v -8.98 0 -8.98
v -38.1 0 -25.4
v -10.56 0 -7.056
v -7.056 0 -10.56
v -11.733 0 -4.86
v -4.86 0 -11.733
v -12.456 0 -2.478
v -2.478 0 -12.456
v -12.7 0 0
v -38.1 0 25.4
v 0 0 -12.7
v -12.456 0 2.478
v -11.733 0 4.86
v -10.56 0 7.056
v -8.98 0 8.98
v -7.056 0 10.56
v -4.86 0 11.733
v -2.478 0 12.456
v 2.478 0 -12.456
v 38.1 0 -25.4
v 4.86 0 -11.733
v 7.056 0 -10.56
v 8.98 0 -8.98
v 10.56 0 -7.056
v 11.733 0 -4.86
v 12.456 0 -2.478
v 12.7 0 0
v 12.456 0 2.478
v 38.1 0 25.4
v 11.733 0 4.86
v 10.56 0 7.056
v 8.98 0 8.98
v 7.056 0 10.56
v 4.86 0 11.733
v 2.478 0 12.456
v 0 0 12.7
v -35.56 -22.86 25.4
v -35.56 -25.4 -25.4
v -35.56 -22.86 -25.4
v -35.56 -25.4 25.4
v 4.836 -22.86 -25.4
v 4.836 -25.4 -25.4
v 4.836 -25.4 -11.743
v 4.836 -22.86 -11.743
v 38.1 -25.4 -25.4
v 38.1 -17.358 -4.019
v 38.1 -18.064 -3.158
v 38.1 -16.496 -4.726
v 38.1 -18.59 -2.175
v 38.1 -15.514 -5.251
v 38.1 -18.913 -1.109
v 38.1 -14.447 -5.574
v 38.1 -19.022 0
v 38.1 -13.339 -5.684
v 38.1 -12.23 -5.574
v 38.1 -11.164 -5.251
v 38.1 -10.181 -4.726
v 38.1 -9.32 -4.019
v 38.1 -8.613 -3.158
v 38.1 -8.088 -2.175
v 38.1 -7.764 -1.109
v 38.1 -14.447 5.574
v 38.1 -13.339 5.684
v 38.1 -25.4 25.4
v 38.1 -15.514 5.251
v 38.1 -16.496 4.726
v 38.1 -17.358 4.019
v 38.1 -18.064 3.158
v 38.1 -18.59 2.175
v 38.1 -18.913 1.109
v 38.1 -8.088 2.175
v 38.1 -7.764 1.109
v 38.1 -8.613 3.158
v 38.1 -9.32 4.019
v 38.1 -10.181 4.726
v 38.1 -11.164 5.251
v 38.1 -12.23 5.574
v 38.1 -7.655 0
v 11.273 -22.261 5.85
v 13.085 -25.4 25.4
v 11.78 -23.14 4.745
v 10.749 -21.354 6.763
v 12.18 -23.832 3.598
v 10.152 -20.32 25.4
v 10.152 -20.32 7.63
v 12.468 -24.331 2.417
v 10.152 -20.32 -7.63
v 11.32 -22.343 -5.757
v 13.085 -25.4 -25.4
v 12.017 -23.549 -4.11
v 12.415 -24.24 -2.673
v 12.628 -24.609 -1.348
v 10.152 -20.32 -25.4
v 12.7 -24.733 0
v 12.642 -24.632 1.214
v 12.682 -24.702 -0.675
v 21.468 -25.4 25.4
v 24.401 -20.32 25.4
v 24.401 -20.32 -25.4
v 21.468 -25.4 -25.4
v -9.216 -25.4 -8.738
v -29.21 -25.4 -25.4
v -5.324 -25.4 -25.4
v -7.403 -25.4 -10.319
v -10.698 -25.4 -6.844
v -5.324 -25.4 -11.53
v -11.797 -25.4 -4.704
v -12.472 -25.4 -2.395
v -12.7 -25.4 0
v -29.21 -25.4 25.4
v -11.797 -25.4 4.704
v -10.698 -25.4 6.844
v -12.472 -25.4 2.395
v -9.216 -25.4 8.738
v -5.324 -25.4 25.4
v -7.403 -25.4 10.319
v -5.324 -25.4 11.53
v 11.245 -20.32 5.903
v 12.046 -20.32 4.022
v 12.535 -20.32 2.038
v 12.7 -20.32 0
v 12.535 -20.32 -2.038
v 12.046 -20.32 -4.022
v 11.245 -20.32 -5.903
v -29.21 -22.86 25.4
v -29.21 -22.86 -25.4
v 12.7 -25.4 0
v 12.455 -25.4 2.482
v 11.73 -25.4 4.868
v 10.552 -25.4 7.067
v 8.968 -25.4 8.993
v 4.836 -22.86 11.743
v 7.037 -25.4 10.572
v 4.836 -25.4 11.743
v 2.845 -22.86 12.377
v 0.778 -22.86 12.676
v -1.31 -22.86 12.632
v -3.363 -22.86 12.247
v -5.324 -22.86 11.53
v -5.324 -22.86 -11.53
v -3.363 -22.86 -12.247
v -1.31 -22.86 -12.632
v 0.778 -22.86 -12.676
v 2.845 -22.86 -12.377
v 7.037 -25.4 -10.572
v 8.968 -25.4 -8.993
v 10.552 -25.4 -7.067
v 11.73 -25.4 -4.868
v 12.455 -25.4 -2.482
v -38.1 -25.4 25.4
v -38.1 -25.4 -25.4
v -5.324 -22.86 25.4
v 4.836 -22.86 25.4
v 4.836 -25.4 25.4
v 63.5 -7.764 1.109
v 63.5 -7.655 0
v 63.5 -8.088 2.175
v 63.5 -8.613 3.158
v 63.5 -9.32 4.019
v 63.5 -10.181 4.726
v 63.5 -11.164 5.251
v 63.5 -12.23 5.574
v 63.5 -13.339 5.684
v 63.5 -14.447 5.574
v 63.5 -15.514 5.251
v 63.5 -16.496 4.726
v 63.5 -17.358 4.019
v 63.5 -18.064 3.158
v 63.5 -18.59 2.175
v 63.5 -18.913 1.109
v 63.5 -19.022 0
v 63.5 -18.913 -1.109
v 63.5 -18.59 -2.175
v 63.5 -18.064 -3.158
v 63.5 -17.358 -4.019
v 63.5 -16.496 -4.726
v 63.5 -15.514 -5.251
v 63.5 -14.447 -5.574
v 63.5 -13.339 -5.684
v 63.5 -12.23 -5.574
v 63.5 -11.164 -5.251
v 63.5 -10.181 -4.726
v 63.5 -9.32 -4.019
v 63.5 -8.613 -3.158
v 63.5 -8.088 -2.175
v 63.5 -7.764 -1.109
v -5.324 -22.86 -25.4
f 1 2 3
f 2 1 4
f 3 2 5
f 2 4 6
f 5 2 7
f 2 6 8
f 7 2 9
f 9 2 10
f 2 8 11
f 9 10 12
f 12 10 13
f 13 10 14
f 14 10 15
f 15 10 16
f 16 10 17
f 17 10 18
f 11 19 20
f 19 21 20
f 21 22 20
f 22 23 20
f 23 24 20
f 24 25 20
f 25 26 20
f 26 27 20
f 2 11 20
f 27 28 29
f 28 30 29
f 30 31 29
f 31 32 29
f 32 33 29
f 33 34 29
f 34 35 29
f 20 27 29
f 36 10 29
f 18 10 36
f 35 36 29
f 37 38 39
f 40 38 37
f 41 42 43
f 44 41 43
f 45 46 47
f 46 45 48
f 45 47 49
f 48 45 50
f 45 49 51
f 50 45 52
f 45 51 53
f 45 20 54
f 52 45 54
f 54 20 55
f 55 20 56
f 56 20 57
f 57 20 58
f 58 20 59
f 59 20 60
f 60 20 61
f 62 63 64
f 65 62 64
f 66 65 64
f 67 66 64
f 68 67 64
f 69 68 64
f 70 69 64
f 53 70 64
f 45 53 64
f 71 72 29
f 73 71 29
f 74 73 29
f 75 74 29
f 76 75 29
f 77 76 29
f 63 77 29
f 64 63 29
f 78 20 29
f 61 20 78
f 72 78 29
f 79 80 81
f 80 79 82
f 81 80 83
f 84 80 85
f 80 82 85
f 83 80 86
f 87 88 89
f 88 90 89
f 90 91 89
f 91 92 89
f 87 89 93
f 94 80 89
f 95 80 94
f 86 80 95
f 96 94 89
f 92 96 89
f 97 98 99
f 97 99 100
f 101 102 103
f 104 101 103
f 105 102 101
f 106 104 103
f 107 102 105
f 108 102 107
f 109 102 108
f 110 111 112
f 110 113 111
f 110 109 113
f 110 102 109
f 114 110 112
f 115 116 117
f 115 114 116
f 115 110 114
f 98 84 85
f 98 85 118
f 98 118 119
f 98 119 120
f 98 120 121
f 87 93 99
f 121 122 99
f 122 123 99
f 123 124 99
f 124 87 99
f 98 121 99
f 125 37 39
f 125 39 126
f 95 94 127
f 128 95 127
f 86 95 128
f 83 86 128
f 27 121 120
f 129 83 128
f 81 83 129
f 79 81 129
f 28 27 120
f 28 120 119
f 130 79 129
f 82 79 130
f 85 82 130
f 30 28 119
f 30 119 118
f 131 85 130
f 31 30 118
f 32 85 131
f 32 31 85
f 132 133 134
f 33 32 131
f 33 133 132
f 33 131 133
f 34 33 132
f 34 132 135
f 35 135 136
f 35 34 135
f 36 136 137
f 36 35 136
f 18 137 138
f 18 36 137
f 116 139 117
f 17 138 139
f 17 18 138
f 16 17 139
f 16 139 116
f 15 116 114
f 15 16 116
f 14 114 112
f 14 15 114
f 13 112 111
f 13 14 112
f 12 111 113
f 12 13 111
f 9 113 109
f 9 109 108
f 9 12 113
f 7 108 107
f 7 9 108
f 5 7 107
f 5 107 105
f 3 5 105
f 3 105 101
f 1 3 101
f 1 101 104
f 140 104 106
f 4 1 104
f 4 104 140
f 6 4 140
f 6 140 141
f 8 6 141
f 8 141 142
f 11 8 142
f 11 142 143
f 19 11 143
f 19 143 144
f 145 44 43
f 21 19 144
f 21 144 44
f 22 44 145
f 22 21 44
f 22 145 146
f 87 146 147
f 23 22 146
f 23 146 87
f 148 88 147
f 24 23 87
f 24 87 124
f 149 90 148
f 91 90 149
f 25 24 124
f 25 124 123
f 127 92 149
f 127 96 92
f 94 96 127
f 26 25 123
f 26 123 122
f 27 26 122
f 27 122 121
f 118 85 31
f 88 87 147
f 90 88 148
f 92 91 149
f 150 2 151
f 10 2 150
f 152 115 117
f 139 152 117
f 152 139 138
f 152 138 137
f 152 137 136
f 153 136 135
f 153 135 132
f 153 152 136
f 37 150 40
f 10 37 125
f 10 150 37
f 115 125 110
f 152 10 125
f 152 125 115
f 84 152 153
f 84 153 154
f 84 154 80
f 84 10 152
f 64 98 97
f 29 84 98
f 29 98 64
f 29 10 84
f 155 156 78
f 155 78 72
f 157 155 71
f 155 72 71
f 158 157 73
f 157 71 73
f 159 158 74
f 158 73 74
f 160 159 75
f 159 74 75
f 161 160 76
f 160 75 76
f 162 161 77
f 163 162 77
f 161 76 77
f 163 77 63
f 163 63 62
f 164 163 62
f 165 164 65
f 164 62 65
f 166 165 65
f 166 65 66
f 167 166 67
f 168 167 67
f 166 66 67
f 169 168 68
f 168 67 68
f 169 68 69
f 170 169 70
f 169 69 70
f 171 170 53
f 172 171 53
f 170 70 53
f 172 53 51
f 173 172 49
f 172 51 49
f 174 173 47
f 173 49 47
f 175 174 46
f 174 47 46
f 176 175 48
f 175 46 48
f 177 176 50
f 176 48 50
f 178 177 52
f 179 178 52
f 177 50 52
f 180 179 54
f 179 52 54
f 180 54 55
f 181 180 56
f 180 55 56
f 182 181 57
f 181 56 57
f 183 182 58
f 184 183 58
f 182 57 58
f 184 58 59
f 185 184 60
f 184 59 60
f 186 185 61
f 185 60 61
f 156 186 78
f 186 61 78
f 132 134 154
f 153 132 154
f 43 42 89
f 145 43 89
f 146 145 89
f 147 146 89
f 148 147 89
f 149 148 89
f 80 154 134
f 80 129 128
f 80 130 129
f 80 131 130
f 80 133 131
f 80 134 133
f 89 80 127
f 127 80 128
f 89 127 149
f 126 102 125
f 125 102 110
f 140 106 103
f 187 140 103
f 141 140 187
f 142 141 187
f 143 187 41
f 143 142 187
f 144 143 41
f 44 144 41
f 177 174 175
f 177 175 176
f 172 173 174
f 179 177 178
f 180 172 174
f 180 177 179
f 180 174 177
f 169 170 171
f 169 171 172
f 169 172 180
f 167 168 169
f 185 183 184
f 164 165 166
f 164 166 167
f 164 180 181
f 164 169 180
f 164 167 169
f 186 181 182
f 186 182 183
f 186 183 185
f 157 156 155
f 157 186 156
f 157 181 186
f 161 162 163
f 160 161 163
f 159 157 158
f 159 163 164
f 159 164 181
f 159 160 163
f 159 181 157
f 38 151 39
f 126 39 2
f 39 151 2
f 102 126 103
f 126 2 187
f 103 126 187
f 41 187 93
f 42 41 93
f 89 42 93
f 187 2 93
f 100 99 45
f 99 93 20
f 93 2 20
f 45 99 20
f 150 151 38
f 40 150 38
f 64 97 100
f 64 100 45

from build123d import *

# Parameters (mm, degrees)
F0_W     = 76.2
F0_H     = 50.8
F0_R     = 12.7
F1_DEPTH = 25.4
F2_W     = 6.35
F2_H     = 50.8
F3_DEPTH = 2.54
F5_DEPTH = 50.801
F6_R     = 5.6836781625
F7_DEPTH = 25.4


with BuildPart() as f1:
    # F0 (on Front) → F1 (new body)
    with BuildSketch(Plane.XZ):
        Rectangle(F0_W, F0_H)
        Circle(F0_R, mode=Mode.SUBTRACT)
    extrude(amount=F1_DEPTH)

    # F2 (on face) → F3 (cut)
    with BuildSketch(Plane.XZ.offset(25.4)):
        with Locations((-32.385, 0)):
            Rectangle(F2_W, F2_H)
        with BuildLine():
            Line((-5.324405618, -11.5299915358), (-5.324405618, -25.4))
            Line((-5.324405618, -25.4), (4.835594382, -25.4))
            Line((4.835594382, -25.4), (4.835594382, -11.7433822629))
            ThreePointArc((4.835594382, -11.7433822629), (-0.2666795956, -12.6971997698), (-5.324405618, -11.5299915358))
        make_face()
        with BuildLine():
            Line((4.835594382, 25.4), (-5.324405618, 25.4))
            Line((-5.324405618, 25.4), (-5.324405618, 11.5299915358))
            ThreePointArc((-5.324405618, 11.5299915358), (-0.2666795956, 12.6971997698), (4.835594382, 11.7433822629))
            Line((4.835594382, 11.7433822629), (4.835594382, 25.4))
        make_face()
    extrude(amount=-F3_DEPTH, mode=Mode.SUBTRACT)

    # F4 (on face) → F5 (cut, through all)
    with BuildSketch(Plane(origin=(0, 0, -25.4), x_dir=(1, 0, 0), z_dir=(0, 0, -1))):
        Polygon((21.467797191, 25.4), (13.0851396952, 25.4), (10.1522003277, 20.32), (24.4007365585, 20.32), align=None)
    extrude(amount=-F5_DEPTH, mode=Mode.SUBTRACT)

    # F6 (on face) → F7 (join)
    with BuildSketch(Plane.YZ.offset(38.1)):
        with Locations((-13.3386543021, 0)):
            Circle(F6_R)
    extrude(amount=F7_DEPTH)


solid = f1.part
